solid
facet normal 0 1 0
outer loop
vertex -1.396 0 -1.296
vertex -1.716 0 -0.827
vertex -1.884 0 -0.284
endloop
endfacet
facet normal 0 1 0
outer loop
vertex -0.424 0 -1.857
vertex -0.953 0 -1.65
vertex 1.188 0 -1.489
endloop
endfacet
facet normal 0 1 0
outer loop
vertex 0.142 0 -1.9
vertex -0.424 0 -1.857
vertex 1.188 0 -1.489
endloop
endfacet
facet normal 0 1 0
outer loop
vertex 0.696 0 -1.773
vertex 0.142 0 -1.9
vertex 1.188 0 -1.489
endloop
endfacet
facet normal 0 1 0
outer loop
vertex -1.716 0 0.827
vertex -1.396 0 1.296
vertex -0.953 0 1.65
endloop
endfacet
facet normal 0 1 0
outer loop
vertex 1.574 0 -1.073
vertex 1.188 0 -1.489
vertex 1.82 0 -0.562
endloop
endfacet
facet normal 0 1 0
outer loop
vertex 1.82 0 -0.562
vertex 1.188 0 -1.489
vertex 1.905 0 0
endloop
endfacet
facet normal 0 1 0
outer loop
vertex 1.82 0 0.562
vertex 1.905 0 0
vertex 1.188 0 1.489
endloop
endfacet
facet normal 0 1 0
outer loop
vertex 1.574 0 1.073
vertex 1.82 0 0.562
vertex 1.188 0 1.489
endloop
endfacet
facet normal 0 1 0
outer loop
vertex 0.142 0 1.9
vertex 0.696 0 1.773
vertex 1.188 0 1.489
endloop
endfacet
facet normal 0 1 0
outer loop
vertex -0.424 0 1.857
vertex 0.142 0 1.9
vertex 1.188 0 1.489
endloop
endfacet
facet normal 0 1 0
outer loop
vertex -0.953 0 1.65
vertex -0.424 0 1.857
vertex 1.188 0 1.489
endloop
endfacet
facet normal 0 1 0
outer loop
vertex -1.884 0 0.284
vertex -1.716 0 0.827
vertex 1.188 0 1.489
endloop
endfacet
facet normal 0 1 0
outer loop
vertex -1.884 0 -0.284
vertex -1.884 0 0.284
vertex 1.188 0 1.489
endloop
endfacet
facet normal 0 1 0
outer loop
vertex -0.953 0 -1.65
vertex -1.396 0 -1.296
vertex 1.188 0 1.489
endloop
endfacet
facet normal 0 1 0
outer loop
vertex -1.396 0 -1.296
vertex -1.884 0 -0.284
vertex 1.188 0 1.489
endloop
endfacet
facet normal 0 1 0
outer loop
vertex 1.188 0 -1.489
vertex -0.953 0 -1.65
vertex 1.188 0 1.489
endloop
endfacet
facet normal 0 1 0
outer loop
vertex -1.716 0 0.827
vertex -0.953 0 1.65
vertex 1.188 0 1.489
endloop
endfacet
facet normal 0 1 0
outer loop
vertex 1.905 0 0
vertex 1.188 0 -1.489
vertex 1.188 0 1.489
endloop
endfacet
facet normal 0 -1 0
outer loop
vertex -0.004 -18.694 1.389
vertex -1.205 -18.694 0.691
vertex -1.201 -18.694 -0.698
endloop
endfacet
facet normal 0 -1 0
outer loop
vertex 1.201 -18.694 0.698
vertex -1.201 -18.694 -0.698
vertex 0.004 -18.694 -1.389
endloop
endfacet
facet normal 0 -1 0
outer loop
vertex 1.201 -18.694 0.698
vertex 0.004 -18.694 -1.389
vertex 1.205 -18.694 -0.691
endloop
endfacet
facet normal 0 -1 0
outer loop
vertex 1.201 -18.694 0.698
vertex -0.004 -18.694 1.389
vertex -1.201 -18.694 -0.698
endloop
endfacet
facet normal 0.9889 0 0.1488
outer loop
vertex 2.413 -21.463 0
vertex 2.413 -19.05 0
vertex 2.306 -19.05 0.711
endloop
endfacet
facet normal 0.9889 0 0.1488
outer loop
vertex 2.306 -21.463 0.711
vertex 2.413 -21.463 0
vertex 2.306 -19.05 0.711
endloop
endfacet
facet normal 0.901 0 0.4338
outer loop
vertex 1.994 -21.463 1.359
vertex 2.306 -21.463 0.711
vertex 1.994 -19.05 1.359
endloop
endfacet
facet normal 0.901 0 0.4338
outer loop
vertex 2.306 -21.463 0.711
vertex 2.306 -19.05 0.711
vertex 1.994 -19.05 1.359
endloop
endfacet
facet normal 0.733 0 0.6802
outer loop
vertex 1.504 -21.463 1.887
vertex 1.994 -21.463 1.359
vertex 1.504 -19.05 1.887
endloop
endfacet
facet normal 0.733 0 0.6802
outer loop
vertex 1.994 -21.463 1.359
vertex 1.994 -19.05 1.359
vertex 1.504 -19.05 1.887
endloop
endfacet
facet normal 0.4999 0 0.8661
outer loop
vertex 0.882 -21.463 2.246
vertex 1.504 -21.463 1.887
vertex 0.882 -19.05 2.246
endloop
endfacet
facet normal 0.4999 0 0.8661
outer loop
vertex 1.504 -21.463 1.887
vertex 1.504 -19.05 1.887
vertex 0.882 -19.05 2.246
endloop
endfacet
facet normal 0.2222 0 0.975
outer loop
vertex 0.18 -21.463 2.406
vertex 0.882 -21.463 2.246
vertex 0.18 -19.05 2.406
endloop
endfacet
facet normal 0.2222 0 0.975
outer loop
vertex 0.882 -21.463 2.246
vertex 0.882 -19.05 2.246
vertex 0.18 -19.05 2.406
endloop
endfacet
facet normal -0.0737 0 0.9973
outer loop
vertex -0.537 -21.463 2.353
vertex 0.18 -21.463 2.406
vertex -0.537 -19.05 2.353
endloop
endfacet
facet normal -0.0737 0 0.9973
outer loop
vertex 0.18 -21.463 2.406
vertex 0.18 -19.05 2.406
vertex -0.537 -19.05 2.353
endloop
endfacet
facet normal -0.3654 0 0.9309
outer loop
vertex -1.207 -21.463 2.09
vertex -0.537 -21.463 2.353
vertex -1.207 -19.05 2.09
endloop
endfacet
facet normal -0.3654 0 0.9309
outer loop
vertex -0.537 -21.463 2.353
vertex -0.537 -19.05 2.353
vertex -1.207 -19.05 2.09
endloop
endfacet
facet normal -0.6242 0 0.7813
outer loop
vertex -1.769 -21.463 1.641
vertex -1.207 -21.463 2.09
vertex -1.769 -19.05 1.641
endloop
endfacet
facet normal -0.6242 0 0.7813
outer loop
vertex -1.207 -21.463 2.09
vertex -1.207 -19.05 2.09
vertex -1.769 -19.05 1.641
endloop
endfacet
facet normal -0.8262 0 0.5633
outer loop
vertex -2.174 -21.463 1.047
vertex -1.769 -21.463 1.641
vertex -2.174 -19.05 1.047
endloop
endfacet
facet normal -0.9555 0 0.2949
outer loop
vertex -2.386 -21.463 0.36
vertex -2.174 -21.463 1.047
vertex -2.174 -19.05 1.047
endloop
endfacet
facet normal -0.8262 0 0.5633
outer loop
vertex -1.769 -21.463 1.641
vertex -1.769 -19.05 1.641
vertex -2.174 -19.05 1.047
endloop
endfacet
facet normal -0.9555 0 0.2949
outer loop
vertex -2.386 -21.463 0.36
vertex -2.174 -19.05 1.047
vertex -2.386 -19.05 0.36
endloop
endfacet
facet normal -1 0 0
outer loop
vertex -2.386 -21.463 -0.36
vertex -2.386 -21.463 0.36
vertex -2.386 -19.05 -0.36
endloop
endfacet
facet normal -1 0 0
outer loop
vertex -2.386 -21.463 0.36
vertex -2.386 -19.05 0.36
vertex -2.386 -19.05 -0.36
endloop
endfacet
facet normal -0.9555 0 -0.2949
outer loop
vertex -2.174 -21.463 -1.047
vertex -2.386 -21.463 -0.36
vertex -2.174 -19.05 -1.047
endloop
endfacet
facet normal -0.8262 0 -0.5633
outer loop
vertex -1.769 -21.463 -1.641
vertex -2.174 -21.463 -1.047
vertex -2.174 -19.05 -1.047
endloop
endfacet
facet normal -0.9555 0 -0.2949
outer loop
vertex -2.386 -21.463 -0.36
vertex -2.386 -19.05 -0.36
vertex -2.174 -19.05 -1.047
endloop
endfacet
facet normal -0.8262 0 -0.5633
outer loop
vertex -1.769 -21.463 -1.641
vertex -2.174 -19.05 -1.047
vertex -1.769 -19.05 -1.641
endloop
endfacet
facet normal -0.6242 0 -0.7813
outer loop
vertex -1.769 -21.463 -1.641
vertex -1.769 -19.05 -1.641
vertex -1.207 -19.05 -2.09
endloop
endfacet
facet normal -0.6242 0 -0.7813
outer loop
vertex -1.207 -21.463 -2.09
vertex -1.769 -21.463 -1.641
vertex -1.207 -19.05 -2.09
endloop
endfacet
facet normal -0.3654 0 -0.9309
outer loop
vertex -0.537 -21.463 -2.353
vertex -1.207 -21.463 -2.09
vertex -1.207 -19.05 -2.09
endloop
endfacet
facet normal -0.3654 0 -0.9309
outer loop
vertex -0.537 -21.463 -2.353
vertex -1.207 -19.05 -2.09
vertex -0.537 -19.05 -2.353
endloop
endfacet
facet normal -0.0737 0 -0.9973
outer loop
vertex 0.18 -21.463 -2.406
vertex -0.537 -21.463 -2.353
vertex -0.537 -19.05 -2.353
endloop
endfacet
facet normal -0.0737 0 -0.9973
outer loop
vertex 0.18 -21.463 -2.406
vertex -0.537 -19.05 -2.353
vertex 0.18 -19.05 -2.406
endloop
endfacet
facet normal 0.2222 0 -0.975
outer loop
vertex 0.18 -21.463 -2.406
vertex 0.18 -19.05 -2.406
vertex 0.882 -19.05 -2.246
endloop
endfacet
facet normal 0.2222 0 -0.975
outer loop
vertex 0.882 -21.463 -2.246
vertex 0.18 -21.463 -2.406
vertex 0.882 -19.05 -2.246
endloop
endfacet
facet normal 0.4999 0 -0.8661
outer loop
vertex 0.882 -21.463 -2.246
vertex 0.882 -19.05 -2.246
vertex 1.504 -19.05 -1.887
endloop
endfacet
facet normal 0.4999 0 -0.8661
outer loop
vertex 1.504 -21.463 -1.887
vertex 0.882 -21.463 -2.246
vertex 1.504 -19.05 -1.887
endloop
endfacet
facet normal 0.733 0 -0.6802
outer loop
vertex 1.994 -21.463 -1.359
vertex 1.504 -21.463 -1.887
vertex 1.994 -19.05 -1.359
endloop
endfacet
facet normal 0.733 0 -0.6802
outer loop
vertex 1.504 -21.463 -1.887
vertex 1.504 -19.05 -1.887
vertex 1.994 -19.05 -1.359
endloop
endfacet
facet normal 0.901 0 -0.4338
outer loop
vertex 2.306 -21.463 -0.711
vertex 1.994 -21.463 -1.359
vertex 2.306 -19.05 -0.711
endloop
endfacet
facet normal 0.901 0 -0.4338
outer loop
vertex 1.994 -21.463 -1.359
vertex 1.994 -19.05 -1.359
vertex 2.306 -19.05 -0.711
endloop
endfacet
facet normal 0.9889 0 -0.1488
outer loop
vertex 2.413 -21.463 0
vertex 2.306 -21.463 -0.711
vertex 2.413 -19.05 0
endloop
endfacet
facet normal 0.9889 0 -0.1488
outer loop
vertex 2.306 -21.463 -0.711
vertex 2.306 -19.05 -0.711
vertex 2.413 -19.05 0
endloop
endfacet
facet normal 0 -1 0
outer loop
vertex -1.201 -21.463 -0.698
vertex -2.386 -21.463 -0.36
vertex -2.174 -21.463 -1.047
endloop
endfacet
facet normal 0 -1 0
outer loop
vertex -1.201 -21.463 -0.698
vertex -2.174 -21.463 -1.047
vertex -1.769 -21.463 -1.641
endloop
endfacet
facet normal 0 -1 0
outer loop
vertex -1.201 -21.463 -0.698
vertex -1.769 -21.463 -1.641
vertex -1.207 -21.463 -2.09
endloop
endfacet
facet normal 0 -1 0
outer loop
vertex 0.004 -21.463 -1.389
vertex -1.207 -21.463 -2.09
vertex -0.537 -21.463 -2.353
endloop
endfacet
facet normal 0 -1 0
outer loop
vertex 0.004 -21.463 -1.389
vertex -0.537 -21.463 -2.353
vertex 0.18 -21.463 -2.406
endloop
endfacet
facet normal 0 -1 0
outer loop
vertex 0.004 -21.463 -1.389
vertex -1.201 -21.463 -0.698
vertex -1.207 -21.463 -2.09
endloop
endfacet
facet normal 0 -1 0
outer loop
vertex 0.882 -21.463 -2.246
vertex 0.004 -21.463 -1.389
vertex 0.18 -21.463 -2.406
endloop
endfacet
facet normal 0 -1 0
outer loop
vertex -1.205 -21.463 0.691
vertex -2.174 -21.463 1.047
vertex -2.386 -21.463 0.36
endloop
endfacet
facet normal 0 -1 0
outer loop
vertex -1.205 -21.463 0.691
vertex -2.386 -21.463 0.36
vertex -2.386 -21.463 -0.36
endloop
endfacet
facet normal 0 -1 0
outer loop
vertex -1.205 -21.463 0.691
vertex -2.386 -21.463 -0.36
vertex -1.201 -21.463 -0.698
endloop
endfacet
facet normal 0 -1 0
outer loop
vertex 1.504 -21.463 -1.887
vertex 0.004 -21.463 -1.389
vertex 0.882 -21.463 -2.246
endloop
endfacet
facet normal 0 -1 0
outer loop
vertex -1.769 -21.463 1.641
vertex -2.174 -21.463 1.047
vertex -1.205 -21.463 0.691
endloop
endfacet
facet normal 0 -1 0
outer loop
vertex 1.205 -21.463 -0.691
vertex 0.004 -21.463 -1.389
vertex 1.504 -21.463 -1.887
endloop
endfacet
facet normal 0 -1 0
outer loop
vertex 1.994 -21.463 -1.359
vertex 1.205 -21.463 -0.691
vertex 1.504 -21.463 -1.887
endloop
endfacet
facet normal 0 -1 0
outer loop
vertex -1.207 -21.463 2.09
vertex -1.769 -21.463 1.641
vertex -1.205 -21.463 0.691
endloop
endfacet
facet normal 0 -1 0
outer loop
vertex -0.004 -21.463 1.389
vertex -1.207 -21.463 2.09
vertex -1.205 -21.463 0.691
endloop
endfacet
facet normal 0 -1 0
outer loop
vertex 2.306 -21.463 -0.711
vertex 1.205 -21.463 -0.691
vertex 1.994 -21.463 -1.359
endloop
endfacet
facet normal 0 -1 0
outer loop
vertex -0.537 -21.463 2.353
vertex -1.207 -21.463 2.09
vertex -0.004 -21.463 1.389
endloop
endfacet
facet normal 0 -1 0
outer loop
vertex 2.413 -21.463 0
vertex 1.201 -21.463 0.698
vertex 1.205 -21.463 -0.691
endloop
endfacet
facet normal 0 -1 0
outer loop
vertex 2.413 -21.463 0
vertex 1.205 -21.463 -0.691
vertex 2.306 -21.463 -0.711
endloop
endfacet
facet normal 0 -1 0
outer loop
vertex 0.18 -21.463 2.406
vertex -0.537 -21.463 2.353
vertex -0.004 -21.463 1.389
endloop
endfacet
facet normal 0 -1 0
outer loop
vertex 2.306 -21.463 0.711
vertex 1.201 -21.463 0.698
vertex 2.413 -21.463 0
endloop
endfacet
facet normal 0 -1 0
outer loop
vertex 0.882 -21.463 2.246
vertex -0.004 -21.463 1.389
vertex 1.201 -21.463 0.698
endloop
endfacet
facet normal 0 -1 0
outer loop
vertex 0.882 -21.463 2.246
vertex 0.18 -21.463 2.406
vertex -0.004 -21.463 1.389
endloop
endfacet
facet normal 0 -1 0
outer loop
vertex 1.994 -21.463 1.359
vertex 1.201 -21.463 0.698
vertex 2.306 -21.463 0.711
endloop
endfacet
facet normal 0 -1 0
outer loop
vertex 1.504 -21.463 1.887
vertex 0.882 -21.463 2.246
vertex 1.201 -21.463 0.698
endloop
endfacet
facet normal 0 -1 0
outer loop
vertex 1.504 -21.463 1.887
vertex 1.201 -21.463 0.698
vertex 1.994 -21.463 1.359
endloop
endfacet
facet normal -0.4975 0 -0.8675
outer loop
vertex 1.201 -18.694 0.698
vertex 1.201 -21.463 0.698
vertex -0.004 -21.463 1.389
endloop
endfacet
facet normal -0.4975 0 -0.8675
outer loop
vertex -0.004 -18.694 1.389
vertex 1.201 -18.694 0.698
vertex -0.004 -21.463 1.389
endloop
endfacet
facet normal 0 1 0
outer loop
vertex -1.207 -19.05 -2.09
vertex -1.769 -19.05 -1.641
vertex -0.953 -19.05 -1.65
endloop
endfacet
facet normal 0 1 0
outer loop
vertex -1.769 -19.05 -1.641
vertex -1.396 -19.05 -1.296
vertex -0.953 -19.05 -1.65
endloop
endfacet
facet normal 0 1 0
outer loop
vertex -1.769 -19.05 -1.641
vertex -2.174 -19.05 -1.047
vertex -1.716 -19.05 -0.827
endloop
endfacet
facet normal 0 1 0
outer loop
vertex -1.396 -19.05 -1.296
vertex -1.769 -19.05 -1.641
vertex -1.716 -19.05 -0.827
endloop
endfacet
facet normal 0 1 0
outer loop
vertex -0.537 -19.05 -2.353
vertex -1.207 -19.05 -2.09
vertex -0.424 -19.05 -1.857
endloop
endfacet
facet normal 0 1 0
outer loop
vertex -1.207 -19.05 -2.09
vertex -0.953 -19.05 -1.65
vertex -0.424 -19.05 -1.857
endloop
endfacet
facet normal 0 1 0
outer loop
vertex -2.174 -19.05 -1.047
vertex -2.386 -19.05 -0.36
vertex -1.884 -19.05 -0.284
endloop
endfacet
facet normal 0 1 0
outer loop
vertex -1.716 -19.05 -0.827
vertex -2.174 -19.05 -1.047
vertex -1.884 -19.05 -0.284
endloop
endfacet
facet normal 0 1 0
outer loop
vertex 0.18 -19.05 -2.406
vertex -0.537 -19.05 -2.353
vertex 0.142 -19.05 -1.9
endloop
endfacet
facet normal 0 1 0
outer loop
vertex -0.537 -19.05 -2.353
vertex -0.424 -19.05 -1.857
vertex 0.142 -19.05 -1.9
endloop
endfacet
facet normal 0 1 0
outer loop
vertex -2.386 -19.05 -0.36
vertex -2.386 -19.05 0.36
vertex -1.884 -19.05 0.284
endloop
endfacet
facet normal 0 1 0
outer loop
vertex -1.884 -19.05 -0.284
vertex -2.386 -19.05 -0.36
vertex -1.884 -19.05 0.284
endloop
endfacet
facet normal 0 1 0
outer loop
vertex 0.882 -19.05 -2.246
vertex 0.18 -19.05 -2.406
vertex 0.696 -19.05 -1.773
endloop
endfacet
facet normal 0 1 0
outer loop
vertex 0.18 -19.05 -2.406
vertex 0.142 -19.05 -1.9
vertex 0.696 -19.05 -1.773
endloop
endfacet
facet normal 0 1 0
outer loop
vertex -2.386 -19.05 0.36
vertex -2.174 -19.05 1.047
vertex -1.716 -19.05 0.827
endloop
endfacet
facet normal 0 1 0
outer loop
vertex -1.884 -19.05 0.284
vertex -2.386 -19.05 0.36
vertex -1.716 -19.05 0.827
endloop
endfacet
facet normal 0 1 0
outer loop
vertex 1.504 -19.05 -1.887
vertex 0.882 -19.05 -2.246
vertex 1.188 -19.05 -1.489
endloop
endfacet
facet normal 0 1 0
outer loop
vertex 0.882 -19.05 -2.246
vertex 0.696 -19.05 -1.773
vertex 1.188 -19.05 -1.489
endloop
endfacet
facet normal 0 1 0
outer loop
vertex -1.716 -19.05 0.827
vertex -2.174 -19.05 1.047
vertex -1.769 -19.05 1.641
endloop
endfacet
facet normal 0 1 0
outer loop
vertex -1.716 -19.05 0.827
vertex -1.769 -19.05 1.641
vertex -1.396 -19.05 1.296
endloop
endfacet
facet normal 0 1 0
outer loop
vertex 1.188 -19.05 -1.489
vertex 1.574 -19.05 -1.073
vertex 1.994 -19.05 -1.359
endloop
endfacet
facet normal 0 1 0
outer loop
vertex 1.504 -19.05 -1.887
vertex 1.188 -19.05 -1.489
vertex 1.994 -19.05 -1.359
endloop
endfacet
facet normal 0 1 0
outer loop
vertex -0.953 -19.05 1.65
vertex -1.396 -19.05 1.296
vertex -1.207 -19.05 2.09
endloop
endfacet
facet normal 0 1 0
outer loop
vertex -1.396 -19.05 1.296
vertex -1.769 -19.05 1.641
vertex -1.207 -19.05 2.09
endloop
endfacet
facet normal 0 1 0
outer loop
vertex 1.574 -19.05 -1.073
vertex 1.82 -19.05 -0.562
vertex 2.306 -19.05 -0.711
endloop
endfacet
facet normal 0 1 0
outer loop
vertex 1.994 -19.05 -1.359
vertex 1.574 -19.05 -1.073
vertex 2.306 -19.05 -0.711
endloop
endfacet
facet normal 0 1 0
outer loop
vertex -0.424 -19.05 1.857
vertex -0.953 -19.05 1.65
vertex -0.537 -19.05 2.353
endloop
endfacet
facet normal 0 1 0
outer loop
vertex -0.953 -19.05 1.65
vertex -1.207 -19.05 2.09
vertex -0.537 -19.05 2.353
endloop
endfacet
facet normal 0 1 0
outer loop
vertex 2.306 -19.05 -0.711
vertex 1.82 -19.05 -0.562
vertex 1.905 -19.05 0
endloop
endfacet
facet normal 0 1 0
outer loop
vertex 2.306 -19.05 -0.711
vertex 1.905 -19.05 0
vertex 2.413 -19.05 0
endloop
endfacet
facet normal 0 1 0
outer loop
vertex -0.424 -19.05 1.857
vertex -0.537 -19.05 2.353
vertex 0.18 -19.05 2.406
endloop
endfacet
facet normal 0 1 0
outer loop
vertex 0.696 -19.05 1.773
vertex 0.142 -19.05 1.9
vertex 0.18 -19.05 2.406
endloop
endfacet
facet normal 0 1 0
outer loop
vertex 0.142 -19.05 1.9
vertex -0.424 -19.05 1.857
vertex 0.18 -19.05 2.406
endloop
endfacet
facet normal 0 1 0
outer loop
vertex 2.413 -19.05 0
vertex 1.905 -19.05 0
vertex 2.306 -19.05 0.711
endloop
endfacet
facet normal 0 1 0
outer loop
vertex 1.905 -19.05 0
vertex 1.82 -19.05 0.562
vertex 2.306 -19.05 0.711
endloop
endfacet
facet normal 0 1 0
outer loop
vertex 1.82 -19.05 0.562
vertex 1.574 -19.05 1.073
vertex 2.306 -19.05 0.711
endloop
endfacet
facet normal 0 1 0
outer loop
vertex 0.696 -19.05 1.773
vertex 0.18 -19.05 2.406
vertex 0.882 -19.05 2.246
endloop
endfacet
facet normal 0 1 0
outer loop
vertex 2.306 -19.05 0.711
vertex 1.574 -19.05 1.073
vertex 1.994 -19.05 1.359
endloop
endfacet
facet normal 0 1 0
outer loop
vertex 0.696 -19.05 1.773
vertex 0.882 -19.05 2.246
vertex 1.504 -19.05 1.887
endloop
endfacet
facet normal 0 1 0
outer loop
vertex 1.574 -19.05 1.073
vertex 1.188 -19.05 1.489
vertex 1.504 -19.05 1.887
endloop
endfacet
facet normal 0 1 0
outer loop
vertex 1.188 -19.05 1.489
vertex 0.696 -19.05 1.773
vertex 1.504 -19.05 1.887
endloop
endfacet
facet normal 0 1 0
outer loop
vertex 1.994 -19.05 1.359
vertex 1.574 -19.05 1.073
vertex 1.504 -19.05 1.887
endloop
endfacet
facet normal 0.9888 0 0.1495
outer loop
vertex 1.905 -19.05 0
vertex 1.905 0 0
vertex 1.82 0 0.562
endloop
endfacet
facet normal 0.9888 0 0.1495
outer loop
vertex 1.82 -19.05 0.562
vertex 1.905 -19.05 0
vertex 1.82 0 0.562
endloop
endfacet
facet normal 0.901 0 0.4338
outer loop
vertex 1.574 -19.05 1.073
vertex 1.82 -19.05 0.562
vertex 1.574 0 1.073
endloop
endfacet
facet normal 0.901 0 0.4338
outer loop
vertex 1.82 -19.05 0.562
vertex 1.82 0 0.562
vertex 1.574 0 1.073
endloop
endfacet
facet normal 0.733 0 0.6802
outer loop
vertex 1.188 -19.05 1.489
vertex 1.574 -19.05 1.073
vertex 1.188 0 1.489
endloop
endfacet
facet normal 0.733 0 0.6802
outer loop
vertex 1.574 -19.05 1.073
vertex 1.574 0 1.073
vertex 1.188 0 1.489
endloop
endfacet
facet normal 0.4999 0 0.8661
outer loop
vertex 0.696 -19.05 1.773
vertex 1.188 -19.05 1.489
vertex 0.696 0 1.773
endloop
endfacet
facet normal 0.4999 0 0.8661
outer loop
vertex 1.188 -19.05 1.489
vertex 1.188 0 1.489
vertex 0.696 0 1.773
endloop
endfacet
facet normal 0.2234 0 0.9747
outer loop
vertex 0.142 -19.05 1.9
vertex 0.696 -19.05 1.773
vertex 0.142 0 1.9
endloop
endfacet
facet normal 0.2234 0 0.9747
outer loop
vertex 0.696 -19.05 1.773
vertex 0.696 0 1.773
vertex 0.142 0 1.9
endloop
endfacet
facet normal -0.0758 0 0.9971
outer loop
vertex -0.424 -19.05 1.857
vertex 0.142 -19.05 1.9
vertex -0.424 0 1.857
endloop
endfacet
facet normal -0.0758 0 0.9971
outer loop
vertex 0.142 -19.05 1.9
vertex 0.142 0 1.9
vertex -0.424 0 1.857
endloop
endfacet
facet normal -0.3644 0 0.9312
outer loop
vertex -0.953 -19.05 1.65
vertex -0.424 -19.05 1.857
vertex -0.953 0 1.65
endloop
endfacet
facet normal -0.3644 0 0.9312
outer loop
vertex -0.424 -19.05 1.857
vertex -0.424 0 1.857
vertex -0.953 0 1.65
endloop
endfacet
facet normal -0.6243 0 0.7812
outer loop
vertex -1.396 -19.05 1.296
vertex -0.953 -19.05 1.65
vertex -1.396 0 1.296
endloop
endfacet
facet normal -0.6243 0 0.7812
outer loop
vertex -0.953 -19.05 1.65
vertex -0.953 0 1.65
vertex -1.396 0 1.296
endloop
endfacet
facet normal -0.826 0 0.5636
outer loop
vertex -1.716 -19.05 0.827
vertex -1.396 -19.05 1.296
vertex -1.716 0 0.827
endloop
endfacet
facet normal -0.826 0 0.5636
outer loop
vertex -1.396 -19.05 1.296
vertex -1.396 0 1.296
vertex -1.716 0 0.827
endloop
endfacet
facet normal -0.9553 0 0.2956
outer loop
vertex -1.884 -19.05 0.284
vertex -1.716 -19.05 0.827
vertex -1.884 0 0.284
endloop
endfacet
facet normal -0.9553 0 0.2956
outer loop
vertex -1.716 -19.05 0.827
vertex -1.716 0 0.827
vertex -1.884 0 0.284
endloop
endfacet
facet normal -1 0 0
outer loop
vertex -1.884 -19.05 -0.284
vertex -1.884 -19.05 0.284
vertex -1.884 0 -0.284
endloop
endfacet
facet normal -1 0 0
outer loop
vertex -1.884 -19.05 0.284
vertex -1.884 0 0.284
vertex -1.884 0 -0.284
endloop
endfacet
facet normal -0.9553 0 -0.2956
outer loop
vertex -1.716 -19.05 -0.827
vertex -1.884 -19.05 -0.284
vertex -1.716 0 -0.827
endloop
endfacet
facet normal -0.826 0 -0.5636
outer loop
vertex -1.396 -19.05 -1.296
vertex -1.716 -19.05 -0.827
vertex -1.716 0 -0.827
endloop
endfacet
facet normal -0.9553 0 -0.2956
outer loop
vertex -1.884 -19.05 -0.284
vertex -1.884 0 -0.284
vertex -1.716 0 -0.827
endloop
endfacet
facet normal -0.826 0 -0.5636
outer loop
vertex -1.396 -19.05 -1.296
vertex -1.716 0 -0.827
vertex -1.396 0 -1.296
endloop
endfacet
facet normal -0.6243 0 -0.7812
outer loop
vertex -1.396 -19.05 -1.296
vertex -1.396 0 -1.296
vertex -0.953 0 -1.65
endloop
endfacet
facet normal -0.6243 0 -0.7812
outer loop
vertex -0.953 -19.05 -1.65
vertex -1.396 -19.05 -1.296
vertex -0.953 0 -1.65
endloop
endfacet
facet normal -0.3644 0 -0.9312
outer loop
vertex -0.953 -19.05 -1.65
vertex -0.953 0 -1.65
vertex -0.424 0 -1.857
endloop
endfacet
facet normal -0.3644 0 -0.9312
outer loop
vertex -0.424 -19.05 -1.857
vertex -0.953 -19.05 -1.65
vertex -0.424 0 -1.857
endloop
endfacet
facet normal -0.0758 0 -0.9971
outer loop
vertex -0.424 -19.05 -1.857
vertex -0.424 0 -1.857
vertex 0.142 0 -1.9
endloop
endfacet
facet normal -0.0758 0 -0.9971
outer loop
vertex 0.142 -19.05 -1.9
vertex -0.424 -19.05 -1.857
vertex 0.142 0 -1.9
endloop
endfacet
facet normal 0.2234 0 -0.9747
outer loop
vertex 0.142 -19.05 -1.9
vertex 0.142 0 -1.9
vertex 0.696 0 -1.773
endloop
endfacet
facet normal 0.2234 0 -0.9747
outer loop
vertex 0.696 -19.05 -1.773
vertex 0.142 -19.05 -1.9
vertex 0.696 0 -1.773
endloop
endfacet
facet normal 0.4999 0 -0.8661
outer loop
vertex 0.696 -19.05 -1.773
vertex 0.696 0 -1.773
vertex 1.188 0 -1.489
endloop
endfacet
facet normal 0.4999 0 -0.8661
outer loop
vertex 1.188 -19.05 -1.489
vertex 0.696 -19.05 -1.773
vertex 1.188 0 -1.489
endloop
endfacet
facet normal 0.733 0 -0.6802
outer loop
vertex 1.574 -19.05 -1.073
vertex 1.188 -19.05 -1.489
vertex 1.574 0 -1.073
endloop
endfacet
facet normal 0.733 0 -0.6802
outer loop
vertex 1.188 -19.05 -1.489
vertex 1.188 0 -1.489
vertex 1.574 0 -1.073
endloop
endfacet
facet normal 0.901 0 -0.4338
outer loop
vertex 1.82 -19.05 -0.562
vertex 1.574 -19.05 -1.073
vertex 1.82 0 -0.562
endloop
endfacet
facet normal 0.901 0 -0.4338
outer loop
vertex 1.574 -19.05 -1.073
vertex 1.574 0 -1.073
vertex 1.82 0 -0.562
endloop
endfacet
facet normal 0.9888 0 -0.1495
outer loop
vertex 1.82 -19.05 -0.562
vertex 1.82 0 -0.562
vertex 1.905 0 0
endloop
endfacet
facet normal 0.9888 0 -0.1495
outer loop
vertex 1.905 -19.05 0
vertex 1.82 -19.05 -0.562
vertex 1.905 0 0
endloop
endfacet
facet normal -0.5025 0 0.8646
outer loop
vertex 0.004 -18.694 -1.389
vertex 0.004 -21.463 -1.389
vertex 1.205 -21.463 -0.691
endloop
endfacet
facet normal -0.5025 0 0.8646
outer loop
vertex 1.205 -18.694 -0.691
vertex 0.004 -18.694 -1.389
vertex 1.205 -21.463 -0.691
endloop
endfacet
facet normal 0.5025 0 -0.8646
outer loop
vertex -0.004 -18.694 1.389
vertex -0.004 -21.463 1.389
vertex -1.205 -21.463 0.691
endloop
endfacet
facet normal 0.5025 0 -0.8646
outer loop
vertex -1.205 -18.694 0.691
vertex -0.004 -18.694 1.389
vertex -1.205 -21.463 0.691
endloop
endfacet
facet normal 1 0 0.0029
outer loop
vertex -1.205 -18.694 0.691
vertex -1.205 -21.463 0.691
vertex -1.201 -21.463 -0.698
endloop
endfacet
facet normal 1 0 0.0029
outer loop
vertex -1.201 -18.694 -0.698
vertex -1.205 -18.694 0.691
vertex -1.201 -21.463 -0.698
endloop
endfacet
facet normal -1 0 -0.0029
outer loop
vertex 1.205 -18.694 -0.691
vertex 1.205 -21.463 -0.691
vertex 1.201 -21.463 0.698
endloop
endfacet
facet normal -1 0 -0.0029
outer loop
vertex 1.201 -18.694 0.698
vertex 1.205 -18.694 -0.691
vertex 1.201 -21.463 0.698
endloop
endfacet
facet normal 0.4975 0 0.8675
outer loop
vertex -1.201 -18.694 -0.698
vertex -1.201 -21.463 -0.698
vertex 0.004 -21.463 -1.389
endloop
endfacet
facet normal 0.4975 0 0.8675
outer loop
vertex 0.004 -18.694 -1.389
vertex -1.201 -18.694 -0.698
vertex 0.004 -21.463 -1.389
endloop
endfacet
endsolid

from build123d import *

# Parameters (mm, degrees)
F0_R     = 1.905
F1_DEPTH = 19.05
F2_R     = 2.413
F3_DEPTH = 2.413
F5_DEPTH = 2.7686


with BuildPart() as f1:
    # F0 (on Front) → F1 (new body)
    with BuildSketch(Plane.XZ):
        Circle(F0_R)
    extrude(amount=F1_DEPTH)

    # F2 (on face) → F3 (join)
    with BuildSketch(Plane.XZ.offset(19.05)):
        Circle(F2_R)
    extrude(amount=F3_DEPTH)

    # F4 (on face) → F5 (cut)
    with BuildSketch(Plane.XZ.offset(21.463)):
        Polygon((-0.00353, 1.389058), (-1.204725, 0.691472), (-1.201194, -0.697586), (0.00353, -1.389058), (1.204725, -0.691472), (1.201194, 0.697586), align=None)
    extrude(amount=-F5_DEPTH, mode=Mode.SUBTRACT)


solid = f1.part
